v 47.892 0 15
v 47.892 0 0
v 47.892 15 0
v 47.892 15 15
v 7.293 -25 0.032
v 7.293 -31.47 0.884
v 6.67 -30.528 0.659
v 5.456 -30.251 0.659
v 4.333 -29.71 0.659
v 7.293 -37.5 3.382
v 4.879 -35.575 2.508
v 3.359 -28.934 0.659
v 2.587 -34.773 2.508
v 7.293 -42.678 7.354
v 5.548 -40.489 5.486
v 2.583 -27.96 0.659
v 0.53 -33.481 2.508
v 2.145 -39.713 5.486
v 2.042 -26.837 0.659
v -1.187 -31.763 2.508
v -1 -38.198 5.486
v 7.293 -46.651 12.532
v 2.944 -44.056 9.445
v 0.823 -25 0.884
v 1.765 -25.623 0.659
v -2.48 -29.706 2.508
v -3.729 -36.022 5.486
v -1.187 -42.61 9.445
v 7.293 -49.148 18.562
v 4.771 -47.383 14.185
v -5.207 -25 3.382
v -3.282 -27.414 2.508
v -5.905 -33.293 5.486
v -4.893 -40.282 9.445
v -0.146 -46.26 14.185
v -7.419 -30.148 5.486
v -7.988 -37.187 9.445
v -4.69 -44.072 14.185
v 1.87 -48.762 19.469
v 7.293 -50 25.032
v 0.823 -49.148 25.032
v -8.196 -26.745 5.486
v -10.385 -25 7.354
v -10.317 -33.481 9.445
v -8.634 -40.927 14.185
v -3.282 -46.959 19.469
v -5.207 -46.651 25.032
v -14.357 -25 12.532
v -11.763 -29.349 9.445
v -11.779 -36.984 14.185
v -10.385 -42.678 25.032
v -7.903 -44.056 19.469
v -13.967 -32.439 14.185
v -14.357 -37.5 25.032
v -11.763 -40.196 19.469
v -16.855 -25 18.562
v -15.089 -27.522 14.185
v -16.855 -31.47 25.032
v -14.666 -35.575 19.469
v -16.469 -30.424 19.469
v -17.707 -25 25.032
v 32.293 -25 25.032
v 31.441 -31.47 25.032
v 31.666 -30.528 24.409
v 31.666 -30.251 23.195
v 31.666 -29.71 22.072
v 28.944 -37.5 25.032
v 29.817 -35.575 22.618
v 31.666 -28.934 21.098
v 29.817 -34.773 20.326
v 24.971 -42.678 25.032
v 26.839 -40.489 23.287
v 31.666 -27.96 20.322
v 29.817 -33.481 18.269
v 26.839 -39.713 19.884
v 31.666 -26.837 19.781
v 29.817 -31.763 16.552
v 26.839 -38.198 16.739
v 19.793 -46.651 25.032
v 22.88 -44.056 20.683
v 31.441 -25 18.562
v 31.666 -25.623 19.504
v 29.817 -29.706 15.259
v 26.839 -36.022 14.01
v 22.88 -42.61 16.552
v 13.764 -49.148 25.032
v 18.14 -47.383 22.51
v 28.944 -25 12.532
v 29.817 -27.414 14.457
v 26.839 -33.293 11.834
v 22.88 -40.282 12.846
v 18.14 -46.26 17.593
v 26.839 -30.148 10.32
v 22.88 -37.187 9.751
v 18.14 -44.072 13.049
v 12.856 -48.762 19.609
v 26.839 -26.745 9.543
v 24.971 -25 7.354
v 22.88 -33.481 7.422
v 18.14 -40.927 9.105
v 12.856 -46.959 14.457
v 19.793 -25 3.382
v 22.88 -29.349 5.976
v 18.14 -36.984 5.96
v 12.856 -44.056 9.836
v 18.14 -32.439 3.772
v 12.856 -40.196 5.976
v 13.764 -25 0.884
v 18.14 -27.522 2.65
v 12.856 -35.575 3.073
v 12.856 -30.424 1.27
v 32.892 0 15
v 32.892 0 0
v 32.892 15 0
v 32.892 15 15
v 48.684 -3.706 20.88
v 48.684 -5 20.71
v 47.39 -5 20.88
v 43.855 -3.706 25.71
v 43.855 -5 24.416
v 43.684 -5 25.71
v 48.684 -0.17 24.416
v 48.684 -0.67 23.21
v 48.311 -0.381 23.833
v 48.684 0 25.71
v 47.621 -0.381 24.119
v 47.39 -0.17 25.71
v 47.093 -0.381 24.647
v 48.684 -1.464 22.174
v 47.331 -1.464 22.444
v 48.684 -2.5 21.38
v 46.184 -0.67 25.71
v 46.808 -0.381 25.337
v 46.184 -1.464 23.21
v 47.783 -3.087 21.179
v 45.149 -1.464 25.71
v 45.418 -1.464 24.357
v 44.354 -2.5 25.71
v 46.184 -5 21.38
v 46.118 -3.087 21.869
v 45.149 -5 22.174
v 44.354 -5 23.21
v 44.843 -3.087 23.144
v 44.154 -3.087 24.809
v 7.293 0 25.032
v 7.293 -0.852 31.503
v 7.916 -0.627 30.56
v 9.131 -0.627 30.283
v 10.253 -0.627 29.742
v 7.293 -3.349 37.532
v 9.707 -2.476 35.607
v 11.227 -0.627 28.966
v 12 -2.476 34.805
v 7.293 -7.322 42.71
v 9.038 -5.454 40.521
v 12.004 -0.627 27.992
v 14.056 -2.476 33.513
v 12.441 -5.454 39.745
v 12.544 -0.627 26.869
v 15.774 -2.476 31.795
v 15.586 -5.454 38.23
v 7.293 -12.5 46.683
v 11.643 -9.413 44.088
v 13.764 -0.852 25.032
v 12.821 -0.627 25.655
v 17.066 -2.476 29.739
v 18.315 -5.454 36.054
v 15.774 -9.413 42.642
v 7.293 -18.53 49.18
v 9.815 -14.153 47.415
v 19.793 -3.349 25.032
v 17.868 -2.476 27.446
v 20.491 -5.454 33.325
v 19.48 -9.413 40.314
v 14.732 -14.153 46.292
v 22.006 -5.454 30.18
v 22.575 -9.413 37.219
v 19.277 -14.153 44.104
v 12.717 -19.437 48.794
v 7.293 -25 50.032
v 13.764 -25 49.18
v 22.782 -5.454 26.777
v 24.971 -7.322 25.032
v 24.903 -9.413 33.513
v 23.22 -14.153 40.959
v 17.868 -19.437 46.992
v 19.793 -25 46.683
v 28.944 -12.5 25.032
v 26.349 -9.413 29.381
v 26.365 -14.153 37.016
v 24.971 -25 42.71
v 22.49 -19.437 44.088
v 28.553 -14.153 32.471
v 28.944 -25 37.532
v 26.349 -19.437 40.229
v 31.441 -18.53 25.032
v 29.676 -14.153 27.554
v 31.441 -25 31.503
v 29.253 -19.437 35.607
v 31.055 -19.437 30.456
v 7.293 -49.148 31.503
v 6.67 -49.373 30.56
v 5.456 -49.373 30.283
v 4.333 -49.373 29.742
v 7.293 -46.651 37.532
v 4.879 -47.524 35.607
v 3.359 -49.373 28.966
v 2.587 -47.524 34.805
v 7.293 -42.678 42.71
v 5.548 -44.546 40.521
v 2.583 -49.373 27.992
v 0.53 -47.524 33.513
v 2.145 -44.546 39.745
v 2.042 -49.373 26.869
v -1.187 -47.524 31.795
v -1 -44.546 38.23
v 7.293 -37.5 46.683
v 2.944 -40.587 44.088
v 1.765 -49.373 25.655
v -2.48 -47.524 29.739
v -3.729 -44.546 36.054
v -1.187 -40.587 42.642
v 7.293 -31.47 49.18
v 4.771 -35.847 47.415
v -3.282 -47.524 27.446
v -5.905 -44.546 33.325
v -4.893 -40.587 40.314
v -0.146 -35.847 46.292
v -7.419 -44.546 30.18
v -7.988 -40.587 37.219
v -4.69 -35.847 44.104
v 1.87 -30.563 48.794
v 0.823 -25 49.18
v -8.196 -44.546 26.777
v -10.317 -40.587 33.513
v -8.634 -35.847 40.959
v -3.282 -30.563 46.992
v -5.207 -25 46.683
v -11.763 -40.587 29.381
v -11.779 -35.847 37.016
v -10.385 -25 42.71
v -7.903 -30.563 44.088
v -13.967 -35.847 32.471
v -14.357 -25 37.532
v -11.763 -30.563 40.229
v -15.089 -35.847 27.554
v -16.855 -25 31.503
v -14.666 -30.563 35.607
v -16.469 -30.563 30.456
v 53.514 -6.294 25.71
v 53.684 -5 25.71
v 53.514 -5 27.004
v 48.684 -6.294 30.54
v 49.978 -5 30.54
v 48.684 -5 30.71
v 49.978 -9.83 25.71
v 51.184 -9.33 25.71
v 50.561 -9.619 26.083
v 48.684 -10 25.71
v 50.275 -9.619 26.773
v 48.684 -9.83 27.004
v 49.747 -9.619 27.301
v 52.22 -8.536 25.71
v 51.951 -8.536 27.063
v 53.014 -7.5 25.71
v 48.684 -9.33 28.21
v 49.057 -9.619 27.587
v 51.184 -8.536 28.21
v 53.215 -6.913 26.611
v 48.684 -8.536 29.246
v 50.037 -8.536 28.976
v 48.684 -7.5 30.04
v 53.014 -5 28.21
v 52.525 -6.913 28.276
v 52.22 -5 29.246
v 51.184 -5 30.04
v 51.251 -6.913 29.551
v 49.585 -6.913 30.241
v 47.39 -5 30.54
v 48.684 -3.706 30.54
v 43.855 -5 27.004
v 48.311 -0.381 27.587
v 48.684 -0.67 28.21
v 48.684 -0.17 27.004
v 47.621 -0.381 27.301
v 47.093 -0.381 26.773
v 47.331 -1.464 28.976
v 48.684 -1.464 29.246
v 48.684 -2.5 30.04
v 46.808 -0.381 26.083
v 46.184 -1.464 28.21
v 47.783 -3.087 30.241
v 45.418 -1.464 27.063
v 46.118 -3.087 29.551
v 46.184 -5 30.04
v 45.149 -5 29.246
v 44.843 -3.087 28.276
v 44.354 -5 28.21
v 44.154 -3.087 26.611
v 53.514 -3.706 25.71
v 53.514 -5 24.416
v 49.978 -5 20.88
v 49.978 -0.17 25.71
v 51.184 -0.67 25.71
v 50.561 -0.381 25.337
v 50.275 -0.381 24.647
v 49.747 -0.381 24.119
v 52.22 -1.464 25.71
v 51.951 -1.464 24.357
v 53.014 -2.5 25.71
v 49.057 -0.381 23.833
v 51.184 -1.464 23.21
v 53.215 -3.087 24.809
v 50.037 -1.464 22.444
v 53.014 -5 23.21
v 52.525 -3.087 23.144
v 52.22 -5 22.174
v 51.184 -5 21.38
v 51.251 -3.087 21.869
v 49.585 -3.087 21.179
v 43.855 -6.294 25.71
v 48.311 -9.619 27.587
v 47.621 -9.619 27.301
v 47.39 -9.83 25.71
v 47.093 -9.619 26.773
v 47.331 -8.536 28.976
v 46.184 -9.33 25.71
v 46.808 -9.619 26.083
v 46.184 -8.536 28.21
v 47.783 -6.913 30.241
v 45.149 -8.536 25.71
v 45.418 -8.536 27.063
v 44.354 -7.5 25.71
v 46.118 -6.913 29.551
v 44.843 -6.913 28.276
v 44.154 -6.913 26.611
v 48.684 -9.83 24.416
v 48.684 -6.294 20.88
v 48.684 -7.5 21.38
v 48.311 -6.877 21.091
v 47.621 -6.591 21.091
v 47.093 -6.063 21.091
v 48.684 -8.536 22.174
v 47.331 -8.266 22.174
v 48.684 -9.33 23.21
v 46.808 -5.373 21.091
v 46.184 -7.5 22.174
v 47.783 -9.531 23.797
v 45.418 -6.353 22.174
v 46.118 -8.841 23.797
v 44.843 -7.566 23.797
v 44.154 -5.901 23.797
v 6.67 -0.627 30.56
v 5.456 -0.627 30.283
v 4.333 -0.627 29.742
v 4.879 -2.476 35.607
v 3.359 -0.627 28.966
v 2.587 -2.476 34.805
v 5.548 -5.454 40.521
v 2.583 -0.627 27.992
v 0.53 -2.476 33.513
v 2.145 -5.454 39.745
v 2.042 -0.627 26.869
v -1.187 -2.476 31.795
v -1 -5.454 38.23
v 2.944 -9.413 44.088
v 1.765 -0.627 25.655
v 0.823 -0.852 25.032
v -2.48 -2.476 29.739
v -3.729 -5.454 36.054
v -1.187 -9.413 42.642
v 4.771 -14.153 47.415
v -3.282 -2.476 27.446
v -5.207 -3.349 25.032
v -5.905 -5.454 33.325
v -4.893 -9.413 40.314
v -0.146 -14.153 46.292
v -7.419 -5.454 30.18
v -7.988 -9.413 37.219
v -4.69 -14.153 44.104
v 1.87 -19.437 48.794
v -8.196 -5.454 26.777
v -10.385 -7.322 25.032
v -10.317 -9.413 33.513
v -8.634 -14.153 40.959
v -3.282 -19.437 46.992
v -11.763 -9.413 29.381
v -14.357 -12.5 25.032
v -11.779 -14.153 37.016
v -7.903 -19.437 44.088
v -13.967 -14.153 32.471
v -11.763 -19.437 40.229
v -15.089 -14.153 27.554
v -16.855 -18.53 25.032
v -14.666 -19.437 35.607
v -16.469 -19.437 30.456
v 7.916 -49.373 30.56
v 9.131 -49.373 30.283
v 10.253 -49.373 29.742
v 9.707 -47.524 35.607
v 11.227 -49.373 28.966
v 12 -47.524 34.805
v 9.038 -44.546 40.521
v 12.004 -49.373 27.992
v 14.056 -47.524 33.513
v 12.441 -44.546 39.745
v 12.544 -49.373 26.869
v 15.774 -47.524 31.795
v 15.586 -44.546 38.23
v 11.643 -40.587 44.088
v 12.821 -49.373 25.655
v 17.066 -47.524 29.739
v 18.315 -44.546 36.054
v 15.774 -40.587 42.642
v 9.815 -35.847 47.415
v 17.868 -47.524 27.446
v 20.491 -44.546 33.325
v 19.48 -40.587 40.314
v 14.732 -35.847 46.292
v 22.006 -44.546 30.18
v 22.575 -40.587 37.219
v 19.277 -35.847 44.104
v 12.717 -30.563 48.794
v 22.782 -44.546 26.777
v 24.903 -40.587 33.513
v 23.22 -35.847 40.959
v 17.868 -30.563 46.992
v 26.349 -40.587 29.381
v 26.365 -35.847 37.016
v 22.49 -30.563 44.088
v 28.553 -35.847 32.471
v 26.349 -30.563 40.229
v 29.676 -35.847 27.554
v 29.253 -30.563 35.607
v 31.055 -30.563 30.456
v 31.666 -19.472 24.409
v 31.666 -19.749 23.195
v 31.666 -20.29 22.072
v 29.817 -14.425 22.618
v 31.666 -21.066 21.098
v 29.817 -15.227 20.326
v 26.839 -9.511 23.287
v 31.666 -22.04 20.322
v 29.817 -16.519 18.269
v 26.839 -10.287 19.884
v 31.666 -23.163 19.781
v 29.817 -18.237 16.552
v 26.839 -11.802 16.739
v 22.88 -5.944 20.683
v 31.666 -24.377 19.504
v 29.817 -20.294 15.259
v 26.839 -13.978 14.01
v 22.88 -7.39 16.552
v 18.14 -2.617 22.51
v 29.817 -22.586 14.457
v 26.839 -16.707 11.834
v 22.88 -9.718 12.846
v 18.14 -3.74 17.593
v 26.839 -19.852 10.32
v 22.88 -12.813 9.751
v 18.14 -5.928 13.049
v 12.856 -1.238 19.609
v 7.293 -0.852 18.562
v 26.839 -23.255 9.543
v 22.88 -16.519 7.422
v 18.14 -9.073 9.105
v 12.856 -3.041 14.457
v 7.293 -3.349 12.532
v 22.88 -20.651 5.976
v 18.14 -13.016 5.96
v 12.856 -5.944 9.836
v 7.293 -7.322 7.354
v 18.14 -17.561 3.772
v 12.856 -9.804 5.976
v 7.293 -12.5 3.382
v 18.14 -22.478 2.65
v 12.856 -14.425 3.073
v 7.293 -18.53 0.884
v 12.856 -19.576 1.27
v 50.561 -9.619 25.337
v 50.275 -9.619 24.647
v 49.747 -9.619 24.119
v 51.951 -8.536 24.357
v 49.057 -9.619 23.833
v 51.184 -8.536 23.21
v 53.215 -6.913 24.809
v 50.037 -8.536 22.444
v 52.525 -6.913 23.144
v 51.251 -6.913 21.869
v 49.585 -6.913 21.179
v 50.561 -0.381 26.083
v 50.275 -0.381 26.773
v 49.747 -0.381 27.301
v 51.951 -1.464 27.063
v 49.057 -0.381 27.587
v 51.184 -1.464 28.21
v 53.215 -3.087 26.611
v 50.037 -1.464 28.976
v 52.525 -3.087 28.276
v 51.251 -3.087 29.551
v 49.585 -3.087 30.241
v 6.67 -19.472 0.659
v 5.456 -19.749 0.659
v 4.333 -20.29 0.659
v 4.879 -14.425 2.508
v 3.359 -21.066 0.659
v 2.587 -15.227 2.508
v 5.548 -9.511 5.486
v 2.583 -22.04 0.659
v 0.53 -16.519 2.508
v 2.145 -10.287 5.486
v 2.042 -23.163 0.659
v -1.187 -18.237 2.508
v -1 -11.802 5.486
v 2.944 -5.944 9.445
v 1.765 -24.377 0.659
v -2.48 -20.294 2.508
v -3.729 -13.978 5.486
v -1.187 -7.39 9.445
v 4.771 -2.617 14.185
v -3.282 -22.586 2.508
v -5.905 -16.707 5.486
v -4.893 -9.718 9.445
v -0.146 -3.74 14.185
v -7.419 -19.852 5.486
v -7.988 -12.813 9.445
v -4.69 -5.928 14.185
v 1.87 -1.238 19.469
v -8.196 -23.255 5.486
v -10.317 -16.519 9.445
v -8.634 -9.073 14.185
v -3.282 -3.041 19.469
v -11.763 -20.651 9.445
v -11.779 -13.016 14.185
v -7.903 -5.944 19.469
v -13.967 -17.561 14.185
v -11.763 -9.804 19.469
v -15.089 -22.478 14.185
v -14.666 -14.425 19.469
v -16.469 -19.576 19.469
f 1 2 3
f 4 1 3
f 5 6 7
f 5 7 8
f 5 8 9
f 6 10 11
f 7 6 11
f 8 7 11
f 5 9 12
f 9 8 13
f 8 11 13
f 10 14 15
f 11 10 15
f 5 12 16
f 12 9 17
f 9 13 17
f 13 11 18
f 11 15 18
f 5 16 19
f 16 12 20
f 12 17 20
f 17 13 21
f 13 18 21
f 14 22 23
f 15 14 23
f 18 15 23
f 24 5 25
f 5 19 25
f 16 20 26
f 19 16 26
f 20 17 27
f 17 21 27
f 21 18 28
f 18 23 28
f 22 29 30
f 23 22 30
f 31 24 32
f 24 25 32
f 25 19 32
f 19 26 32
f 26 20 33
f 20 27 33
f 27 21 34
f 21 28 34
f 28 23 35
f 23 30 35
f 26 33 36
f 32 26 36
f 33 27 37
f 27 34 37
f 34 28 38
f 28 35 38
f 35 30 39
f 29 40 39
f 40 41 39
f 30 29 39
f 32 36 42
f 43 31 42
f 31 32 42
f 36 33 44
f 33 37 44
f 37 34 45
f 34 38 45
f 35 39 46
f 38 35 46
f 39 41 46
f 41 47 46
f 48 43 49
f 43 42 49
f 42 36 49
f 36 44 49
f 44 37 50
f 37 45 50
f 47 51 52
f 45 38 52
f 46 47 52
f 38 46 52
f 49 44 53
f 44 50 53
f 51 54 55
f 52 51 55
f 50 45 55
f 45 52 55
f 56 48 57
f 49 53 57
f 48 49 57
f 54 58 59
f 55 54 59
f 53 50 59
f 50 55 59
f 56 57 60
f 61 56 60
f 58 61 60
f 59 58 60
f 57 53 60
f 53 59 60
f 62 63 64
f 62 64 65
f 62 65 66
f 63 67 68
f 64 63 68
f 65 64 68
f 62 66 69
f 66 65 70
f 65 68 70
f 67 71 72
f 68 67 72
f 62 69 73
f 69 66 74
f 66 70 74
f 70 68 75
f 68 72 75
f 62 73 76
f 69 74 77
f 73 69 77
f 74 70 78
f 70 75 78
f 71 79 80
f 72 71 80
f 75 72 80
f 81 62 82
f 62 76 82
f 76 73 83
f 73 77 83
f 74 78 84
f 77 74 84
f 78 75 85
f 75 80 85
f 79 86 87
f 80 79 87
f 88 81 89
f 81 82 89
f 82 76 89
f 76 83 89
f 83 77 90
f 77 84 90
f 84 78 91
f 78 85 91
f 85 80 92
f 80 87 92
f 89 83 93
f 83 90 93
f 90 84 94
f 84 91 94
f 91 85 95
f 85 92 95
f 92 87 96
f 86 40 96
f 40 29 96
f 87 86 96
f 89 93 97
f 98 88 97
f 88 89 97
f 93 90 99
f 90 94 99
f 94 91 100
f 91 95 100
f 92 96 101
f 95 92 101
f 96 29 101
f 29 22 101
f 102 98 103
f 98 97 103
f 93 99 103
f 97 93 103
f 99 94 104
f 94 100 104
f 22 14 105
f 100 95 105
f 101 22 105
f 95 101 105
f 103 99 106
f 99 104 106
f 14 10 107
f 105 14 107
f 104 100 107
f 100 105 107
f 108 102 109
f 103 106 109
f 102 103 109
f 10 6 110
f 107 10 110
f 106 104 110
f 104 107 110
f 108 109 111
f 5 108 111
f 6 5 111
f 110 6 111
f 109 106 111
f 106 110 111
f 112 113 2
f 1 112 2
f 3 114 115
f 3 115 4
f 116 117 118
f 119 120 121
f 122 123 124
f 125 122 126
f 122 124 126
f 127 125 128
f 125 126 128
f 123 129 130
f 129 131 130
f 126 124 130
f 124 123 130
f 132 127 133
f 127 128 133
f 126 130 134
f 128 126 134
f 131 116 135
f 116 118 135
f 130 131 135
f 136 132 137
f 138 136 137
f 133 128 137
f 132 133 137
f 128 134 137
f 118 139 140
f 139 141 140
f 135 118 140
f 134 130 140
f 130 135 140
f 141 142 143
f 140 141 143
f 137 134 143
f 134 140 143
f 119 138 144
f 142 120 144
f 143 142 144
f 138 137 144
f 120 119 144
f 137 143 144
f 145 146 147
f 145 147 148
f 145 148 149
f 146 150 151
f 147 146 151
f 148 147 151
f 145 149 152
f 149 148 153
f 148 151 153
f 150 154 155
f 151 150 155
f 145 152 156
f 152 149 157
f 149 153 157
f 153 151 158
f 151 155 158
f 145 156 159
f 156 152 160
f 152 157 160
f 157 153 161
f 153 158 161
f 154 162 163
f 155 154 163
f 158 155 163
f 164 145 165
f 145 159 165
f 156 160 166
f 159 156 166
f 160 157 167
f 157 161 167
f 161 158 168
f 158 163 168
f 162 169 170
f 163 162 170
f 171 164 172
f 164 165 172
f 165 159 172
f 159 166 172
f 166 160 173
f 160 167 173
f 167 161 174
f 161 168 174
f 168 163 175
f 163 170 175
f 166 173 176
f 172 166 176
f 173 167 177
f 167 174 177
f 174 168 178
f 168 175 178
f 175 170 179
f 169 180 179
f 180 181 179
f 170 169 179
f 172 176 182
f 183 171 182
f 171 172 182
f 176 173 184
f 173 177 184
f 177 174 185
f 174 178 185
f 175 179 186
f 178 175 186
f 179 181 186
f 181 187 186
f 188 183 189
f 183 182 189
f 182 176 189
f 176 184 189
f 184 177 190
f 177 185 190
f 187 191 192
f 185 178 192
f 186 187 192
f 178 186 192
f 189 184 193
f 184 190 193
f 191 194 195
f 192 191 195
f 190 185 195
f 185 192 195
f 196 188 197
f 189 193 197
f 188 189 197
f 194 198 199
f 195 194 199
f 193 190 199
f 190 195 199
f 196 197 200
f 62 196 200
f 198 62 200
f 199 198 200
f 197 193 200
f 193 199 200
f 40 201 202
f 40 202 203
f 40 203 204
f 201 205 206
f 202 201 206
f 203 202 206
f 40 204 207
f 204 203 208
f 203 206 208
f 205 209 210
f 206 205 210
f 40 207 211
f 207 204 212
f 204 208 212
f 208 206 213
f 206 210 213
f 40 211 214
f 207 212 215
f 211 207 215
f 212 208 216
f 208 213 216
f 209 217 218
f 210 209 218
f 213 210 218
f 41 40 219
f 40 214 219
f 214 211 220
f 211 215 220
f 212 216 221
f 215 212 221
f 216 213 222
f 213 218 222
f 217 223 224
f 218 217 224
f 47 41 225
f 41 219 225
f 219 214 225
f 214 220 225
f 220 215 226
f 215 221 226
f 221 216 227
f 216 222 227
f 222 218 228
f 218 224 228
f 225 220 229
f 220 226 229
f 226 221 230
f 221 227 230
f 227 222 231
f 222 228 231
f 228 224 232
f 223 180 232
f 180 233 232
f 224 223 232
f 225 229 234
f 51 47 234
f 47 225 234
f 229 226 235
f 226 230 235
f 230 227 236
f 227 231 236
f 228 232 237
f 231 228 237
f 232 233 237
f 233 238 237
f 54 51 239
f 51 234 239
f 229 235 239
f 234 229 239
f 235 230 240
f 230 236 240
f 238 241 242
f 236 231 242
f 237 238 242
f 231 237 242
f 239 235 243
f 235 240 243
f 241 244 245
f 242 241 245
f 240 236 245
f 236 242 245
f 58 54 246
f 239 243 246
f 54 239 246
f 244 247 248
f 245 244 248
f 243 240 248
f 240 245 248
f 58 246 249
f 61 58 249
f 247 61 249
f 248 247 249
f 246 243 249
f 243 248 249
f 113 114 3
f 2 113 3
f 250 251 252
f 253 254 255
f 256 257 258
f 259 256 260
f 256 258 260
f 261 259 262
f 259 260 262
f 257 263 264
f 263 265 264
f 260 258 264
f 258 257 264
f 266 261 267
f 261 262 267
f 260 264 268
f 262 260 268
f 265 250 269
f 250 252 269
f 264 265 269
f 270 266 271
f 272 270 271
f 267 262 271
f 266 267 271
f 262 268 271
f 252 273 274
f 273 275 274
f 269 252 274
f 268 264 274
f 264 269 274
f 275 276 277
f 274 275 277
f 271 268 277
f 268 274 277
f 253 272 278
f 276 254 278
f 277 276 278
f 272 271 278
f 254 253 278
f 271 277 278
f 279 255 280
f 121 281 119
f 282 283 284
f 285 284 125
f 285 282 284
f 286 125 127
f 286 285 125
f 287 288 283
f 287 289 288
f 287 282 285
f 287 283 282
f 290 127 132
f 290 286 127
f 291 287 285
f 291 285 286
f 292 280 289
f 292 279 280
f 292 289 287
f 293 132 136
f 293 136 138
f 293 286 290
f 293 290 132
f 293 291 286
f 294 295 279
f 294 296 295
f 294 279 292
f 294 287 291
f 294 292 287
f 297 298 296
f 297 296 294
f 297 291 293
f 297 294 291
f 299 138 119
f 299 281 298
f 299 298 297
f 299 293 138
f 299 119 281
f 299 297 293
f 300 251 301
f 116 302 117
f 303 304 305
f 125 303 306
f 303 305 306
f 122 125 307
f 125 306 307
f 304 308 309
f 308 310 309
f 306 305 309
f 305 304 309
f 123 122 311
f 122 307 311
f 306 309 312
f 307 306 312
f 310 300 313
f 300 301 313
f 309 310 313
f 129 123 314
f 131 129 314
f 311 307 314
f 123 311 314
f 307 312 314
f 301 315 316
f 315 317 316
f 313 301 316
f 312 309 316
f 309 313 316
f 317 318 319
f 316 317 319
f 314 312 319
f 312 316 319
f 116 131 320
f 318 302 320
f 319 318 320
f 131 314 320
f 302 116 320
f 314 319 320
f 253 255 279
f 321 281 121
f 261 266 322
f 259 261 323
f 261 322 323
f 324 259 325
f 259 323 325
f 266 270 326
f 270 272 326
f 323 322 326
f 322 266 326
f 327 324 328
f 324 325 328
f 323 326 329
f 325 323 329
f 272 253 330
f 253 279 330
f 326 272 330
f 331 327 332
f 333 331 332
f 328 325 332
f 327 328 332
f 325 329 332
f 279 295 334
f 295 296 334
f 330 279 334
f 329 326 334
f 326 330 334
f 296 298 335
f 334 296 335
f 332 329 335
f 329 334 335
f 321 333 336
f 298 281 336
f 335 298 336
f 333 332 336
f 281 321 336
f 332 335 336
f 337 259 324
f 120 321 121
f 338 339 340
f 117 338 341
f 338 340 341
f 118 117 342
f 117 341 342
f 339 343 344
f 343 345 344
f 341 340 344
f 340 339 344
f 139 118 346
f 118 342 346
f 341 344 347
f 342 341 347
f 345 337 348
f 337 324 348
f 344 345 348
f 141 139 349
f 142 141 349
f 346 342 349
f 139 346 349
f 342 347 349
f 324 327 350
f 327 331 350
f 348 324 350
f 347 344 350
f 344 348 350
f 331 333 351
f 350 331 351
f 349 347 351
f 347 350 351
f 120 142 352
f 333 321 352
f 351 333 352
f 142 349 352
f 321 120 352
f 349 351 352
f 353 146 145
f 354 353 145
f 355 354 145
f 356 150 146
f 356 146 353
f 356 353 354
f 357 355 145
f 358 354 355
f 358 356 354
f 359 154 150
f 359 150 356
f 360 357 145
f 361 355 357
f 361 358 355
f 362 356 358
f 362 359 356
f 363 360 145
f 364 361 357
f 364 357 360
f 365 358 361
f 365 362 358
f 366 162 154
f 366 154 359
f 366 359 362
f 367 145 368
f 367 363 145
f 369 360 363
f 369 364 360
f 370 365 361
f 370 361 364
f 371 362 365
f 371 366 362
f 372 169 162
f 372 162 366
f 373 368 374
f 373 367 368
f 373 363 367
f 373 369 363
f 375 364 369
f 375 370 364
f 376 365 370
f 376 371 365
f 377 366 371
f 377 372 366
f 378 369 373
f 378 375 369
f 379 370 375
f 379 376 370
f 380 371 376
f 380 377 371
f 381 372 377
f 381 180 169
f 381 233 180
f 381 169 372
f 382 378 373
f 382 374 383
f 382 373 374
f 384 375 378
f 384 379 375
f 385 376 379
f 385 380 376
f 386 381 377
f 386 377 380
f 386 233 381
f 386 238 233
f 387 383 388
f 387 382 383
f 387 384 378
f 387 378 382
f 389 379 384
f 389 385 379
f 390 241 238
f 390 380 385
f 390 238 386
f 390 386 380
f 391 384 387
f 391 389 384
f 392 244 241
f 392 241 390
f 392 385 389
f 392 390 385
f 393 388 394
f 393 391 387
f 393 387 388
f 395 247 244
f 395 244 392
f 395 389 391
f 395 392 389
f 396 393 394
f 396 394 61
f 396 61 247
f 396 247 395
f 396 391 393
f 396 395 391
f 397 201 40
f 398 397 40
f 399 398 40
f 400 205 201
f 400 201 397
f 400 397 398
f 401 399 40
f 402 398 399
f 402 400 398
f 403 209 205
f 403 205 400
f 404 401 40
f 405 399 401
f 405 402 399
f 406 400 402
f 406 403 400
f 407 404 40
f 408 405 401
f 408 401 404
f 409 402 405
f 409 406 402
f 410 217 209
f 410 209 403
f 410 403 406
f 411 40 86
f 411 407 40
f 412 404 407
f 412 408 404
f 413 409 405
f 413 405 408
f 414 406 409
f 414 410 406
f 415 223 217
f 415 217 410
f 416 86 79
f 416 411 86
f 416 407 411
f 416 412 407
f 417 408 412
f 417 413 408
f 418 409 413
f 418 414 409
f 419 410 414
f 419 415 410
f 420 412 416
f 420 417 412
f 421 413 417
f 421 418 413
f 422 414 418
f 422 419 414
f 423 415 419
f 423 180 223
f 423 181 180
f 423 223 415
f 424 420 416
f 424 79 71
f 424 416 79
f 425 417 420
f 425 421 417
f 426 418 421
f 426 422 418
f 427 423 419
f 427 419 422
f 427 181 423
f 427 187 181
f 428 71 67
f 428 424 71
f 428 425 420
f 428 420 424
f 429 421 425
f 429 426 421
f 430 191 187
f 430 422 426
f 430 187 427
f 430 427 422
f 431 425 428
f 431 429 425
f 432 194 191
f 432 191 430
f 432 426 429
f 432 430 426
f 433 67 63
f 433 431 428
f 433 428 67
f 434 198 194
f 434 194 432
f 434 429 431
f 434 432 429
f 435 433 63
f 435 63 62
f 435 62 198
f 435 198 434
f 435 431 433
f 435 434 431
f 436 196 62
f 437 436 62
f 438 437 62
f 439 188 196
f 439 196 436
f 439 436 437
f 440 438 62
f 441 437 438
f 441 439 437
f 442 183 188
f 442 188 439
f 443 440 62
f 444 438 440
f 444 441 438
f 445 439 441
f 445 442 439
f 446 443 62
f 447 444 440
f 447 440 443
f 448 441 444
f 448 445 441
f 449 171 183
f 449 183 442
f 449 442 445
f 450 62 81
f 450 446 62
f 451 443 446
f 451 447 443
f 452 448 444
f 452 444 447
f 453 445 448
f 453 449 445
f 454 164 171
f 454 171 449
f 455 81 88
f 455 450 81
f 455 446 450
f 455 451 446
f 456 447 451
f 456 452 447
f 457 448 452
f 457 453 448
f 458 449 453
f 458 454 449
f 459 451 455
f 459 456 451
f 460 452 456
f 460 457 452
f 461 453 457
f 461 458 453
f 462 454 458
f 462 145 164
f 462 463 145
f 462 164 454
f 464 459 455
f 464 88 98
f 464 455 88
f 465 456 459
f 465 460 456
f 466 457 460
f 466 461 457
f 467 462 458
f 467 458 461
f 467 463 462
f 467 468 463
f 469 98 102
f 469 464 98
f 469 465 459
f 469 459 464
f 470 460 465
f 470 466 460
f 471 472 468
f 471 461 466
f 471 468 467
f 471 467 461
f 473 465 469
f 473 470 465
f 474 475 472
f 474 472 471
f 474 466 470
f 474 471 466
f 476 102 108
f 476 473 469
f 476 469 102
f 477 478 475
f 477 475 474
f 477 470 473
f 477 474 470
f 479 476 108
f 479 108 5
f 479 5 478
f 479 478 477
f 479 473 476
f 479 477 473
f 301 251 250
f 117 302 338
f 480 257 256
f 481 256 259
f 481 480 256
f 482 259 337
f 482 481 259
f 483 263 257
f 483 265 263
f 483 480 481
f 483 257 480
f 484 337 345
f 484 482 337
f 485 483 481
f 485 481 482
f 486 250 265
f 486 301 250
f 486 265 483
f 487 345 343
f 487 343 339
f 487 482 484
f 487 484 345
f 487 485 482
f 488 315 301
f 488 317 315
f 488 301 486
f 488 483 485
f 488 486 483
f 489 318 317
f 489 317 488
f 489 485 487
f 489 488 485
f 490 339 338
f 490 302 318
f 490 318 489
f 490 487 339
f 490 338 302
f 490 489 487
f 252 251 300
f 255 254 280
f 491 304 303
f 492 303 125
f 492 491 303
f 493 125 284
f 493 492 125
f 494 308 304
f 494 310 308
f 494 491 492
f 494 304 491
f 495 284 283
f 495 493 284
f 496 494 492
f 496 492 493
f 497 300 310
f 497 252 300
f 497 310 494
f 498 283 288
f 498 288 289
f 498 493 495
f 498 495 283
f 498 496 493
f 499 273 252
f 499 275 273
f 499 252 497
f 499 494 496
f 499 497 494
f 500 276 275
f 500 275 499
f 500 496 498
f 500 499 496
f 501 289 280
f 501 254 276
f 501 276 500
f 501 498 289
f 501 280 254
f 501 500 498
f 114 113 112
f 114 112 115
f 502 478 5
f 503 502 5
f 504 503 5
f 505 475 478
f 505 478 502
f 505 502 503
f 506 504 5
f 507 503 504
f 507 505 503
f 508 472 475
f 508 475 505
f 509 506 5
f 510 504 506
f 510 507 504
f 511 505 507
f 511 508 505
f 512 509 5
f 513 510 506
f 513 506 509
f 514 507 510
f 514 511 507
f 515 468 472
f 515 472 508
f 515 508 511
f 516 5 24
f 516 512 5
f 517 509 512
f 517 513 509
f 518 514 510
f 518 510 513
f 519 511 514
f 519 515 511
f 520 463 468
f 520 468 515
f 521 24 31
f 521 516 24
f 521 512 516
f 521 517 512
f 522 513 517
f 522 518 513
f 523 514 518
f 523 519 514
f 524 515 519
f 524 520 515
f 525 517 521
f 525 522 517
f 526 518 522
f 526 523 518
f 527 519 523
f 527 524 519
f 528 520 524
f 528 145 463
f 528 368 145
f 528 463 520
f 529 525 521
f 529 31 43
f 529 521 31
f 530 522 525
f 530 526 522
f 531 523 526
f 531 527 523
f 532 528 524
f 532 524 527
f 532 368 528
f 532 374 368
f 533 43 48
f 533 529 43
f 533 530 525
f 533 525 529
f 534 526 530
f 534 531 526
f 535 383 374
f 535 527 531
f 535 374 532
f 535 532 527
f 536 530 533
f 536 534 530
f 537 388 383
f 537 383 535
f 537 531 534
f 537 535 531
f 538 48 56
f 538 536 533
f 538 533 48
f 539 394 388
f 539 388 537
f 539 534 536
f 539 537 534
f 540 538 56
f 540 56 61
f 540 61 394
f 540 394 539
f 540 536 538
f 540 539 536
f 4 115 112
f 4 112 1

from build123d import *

# Parameters (mm, degrees)
F0_W     = 50
F0_H     = 50
F1_DEPTH = 50
F2_R     = 24.99999
F3_W     = 10
F3_H     = 10
F4_DEPTH = 10
F5_R     = 4.99999
F6_W     = 15
F6_H     = 15
F7_DEPTH = 15


# Not quite as in the source:
# - a fillet or chamfer is up to 0.001 mm smaller than in the source, because OpenCascade refuses the exact size


with BuildPart() as f1:
    # F0 (on Front) → F1 (new body)
    with BuildSketch(Plane.XZ):
        with Locations((7.293150397, 25.0321394791)):
            Rectangle(F0_W, F0_H)
    extrude(amount=F1_DEPTH)

    # F2 (radius 25 in the source; OpenCascade refuses exactly that, so slightly less here)
    f2_edges = [f1.edges().sort_by_distance(p)[0] for p in [
        (-17.70685, -25, 50.032139),
        (32.29315, -25, 50.032139),
        (7.29315, 0, 50.032139),
        (7.29315, -50, 50.032139),
        (-17.70685, 0, 25.032139),
        (7.29315, 0, 0.032139),
        (32.29315, 0, 25.032139),
        (-17.70685, -50, 25.032139),
        (7.29315, -50, 0.032139),
        (32.29315, -50, 25.032139),
        (32.29315, -25, 0.032139),
        (-17.70685, -25, 0.032139),
    ]]
    fillet(f2_edges, radius=F2_R)


with BuildPart() as f4:
    # F3 (on Front) → F4 (new body)
    with BuildSketch(Plane.XZ):
        with Locations((48.6841630191, 25.7099985783)):
            Rectangle(F3_W, F3_H)
    extrude(amount=F4_DEPTH)

    # F5 (radius 5 in the source; OpenCascade refuses exactly that, so slightly less here)
    f5_edges = [f4.edges().sort_by_distance(p)[0] for p in [
        (53.684163, -5, 20.709999),
        (53.684163, -5, 30.709999),
        (53.684163, 0, 25.709999),
        (53.684163, -10, 25.709999),
        (43.684163, -5, 30.709999),
        (48.684163, 0, 30.709999),
        (48.684163, -10, 30.709999),
        (43.684163, -10, 25.709999),
        (48.684163, -10, 20.709999),
        (43.684163, -5, 20.709999),
        (48.684163, 0, 20.709999),
        (43.684163, 0, 25.709999),
    ]]
    fillet(f5_edges, radius=F5_R)


with BuildPart() as f7:
    # F6 (on Top) → F7 (new body)
    with BuildSketch(Plane.XY):
        with Locations((40.3915693331, 7.5)):
            Rectangle(F6_W, F6_H)
    extrude(amount=F7_DEPTH)


solid = Compound([f1.part, f4.part, f7.part])
